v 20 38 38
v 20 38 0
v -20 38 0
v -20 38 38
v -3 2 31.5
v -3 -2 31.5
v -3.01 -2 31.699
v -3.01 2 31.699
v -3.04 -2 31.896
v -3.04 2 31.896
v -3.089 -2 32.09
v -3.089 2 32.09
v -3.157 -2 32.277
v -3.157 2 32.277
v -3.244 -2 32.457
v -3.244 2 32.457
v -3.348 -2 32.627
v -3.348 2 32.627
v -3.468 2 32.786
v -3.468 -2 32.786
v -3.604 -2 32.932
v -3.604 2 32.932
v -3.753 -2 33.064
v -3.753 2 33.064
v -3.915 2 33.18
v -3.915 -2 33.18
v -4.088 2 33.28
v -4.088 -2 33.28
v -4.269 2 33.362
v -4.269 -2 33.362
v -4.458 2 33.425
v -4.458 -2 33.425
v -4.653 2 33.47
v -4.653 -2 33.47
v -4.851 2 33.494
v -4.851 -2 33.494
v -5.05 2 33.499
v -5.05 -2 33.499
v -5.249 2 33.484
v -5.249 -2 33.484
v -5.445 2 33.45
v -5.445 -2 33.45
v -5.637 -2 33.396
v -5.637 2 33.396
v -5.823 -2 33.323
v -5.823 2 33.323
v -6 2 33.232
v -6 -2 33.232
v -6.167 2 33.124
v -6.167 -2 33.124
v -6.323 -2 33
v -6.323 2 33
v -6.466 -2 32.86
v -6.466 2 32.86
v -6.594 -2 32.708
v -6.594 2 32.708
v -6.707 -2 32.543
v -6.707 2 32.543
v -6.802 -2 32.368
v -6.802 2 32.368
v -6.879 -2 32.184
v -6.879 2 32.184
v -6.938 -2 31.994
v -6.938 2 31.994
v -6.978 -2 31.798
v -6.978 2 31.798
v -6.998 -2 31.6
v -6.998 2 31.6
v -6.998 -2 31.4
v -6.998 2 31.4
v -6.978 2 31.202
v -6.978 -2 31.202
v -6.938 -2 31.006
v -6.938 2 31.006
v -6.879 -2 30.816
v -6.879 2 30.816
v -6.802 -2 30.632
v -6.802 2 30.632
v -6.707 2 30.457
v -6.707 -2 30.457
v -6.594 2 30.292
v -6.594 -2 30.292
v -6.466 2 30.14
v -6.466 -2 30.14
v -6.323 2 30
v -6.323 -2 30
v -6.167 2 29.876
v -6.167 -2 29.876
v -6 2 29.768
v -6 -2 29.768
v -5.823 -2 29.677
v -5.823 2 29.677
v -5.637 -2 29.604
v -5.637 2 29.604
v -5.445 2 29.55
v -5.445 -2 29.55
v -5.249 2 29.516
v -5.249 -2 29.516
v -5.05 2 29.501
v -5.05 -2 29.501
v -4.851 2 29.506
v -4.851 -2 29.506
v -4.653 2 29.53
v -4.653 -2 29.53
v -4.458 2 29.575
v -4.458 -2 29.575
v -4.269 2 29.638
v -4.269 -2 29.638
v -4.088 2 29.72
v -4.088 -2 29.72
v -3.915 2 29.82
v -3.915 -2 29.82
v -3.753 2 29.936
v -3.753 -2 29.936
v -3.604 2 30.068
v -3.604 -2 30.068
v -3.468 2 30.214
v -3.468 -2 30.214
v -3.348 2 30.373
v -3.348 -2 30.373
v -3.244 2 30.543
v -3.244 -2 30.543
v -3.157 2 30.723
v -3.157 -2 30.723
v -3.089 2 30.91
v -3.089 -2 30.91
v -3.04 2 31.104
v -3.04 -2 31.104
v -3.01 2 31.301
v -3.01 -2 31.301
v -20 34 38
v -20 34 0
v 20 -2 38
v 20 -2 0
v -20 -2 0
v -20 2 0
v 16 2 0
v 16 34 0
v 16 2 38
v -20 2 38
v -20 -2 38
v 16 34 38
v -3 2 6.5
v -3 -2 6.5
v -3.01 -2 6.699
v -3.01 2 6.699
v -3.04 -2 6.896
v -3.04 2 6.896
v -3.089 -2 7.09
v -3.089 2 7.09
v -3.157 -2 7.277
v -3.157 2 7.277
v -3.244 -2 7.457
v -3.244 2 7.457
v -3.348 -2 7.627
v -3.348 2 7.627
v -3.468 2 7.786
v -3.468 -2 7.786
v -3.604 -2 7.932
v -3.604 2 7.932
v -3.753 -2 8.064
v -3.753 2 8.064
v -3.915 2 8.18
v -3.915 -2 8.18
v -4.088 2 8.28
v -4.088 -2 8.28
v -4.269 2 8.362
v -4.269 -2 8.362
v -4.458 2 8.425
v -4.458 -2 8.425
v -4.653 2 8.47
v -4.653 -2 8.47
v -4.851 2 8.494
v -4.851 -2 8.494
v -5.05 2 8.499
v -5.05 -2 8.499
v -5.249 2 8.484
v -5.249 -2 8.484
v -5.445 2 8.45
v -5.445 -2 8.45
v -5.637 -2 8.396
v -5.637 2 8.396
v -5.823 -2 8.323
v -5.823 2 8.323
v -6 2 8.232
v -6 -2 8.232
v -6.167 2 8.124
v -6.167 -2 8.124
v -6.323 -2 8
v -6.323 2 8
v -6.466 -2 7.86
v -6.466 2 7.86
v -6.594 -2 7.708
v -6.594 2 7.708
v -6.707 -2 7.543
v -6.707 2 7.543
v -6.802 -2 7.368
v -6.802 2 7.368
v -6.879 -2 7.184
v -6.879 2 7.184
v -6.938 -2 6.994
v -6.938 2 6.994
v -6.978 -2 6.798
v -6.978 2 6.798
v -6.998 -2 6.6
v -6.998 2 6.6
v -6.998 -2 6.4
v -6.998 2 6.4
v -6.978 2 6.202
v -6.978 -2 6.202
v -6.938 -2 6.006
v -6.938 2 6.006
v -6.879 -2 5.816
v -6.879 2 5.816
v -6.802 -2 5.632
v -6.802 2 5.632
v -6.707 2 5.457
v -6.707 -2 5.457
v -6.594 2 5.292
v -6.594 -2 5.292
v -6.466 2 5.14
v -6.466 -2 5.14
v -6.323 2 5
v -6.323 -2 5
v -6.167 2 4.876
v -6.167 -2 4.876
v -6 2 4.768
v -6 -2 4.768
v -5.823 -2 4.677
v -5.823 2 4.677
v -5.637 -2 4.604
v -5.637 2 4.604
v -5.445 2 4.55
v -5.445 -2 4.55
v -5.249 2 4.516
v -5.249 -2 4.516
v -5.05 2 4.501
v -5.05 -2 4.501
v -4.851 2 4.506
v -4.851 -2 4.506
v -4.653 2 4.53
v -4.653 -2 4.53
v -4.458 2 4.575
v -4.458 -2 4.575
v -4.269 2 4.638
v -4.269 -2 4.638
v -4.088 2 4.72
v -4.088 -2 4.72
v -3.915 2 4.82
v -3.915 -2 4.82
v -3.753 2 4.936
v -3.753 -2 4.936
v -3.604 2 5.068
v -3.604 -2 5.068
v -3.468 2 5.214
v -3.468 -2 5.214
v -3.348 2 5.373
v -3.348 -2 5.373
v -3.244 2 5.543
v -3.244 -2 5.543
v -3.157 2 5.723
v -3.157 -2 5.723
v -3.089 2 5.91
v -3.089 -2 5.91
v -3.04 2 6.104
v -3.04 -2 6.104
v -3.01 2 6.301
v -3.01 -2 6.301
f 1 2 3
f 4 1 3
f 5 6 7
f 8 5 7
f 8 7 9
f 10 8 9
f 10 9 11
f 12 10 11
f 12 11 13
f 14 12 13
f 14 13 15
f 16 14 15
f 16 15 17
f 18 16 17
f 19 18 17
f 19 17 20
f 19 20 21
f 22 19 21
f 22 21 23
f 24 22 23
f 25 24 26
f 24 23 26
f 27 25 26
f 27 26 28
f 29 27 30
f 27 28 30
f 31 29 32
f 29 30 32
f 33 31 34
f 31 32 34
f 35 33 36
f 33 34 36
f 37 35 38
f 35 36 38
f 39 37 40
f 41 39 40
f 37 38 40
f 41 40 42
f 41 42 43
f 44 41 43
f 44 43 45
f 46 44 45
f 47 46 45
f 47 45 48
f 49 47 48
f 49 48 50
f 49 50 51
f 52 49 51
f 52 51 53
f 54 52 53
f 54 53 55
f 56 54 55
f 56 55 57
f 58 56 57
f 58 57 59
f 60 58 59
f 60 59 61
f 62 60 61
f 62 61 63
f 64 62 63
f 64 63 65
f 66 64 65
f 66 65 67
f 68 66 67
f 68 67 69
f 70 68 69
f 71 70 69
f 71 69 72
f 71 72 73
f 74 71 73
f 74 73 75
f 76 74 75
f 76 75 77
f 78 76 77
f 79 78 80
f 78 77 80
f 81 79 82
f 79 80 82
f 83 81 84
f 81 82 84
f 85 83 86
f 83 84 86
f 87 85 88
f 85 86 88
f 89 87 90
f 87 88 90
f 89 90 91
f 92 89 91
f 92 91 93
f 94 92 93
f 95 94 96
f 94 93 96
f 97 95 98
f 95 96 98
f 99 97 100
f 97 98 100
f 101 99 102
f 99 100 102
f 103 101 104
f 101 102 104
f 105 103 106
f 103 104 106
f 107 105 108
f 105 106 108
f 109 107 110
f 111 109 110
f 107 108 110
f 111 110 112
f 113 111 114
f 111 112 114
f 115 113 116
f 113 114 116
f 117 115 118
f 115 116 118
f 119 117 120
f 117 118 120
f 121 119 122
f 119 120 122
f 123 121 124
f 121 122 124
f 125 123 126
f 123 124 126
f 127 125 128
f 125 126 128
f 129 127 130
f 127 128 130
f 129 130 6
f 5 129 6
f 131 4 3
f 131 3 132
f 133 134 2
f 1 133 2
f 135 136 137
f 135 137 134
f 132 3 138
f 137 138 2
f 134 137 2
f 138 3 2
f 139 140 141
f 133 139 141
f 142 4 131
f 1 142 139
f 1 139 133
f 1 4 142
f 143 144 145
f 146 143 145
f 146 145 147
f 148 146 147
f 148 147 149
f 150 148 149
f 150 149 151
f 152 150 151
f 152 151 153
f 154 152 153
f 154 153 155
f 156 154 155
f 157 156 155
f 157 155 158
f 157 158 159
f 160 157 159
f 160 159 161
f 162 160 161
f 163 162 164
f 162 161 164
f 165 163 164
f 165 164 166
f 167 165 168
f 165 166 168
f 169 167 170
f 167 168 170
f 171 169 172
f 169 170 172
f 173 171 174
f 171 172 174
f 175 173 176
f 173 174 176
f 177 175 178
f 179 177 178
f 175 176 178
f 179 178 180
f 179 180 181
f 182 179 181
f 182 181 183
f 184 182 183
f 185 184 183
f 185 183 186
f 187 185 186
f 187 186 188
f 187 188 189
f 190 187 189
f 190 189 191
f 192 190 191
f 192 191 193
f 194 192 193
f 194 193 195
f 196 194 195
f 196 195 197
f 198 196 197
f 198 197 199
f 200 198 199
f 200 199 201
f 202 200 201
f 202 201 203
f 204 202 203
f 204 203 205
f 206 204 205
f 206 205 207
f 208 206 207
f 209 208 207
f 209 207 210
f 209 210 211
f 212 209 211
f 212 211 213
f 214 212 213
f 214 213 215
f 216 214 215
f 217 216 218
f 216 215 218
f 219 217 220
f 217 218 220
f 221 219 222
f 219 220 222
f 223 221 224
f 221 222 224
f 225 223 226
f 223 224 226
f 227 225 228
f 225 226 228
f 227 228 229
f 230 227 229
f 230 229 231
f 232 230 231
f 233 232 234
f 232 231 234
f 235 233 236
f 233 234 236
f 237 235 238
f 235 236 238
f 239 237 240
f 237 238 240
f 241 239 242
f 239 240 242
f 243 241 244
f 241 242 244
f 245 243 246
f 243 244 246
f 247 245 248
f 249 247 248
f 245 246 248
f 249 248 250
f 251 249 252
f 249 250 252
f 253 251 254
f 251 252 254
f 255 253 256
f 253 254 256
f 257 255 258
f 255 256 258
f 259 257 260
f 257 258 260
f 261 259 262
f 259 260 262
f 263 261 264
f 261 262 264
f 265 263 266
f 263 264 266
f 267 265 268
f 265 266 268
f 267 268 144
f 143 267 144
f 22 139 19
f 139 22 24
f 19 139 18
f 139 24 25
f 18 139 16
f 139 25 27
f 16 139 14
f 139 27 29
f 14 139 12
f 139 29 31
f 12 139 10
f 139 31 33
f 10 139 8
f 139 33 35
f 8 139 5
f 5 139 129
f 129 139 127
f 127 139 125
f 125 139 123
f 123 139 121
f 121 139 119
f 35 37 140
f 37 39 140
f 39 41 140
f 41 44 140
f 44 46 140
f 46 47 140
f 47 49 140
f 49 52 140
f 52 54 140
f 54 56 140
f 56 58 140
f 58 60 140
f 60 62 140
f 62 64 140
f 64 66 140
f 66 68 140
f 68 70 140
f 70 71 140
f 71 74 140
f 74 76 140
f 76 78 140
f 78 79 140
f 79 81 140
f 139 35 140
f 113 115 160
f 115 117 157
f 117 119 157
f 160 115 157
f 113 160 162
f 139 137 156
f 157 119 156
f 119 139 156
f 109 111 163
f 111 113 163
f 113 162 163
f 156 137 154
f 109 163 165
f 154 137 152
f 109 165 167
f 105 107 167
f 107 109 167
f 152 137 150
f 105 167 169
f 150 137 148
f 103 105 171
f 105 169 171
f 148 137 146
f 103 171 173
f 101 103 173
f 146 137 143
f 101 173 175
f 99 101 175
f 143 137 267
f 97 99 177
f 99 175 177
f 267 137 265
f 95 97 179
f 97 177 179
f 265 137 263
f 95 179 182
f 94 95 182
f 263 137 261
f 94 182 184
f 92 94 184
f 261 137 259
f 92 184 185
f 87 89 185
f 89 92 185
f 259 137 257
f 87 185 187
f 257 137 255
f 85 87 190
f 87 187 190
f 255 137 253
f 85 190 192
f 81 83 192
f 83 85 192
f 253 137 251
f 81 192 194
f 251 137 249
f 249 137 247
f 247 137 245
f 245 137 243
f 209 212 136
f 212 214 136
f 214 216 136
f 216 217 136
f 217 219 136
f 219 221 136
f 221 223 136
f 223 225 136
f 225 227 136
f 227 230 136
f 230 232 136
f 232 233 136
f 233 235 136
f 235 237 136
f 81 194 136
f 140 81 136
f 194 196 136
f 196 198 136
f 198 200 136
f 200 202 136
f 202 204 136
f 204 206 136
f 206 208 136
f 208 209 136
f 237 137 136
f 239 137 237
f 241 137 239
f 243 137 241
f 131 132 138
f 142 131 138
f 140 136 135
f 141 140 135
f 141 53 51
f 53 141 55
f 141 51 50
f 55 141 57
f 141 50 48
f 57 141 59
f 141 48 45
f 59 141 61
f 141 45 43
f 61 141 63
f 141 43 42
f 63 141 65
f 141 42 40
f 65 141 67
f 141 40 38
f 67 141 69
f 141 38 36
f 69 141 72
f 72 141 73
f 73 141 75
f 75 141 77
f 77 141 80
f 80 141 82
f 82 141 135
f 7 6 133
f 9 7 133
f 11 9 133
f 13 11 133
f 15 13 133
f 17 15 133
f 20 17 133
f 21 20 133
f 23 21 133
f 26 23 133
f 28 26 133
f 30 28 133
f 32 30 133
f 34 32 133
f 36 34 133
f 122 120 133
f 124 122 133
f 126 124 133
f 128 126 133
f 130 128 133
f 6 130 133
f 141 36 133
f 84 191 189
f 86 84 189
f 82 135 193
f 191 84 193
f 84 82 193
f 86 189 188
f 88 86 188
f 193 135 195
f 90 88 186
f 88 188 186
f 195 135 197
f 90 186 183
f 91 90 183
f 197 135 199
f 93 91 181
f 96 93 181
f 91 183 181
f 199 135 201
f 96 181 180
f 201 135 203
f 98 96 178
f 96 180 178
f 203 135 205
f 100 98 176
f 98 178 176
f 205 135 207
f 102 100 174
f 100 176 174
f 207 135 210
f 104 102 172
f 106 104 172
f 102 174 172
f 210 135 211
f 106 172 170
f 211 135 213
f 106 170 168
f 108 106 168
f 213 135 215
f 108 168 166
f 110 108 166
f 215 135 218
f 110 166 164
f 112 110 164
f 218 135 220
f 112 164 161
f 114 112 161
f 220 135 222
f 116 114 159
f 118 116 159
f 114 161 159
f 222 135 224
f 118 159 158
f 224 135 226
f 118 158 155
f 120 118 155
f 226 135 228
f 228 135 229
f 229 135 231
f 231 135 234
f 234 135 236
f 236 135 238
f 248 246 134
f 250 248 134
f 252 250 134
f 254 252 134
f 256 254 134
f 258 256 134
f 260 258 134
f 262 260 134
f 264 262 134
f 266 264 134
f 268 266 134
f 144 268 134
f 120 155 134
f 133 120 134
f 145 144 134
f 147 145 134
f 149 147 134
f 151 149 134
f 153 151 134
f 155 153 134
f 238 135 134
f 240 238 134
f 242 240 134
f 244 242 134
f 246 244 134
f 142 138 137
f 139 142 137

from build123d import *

# Parameters (mm, degrees)
BOSS_EXTRU_1_DEPTH      = 38
ESQUISSE2_R             = 2
ENL_V_MAT_EXTRU_1_DEPTH = 10


with BuildPart() as part:
    # Esquisse1 → Boss.-Extru.1 (new body)
    with BuildSketch(Plane.XY):
        Polygon((16, 34), (16, 18), (20, 18), (20, 38), (-20, 38), (-20, 34), align=None)
        Polygon((-20, 2), (-20, -2), (13.980877288, -2), (20, -2), (20, 2), (20, 18), (16, 18), (16, 2), align=None)
    extrude(amount=BOSS_EXTRU_1_DEPTH)

    # Esquisse2 → Enlèv. mat.-Extru.1 (cut)
    with BuildSketch(Plane.XZ.offset(2)):
        with Locations((-5, 31.5)):
            Circle(ESQUISSE2_R)
        with Locations((-5, 6.5)):
            Circle(ESQUISSE2_R)
    extrude(amount=-ENL_V_MAT_EXTRU_1_DEPTH, mode=Mode.SUBTRACT)


solid = part.part
